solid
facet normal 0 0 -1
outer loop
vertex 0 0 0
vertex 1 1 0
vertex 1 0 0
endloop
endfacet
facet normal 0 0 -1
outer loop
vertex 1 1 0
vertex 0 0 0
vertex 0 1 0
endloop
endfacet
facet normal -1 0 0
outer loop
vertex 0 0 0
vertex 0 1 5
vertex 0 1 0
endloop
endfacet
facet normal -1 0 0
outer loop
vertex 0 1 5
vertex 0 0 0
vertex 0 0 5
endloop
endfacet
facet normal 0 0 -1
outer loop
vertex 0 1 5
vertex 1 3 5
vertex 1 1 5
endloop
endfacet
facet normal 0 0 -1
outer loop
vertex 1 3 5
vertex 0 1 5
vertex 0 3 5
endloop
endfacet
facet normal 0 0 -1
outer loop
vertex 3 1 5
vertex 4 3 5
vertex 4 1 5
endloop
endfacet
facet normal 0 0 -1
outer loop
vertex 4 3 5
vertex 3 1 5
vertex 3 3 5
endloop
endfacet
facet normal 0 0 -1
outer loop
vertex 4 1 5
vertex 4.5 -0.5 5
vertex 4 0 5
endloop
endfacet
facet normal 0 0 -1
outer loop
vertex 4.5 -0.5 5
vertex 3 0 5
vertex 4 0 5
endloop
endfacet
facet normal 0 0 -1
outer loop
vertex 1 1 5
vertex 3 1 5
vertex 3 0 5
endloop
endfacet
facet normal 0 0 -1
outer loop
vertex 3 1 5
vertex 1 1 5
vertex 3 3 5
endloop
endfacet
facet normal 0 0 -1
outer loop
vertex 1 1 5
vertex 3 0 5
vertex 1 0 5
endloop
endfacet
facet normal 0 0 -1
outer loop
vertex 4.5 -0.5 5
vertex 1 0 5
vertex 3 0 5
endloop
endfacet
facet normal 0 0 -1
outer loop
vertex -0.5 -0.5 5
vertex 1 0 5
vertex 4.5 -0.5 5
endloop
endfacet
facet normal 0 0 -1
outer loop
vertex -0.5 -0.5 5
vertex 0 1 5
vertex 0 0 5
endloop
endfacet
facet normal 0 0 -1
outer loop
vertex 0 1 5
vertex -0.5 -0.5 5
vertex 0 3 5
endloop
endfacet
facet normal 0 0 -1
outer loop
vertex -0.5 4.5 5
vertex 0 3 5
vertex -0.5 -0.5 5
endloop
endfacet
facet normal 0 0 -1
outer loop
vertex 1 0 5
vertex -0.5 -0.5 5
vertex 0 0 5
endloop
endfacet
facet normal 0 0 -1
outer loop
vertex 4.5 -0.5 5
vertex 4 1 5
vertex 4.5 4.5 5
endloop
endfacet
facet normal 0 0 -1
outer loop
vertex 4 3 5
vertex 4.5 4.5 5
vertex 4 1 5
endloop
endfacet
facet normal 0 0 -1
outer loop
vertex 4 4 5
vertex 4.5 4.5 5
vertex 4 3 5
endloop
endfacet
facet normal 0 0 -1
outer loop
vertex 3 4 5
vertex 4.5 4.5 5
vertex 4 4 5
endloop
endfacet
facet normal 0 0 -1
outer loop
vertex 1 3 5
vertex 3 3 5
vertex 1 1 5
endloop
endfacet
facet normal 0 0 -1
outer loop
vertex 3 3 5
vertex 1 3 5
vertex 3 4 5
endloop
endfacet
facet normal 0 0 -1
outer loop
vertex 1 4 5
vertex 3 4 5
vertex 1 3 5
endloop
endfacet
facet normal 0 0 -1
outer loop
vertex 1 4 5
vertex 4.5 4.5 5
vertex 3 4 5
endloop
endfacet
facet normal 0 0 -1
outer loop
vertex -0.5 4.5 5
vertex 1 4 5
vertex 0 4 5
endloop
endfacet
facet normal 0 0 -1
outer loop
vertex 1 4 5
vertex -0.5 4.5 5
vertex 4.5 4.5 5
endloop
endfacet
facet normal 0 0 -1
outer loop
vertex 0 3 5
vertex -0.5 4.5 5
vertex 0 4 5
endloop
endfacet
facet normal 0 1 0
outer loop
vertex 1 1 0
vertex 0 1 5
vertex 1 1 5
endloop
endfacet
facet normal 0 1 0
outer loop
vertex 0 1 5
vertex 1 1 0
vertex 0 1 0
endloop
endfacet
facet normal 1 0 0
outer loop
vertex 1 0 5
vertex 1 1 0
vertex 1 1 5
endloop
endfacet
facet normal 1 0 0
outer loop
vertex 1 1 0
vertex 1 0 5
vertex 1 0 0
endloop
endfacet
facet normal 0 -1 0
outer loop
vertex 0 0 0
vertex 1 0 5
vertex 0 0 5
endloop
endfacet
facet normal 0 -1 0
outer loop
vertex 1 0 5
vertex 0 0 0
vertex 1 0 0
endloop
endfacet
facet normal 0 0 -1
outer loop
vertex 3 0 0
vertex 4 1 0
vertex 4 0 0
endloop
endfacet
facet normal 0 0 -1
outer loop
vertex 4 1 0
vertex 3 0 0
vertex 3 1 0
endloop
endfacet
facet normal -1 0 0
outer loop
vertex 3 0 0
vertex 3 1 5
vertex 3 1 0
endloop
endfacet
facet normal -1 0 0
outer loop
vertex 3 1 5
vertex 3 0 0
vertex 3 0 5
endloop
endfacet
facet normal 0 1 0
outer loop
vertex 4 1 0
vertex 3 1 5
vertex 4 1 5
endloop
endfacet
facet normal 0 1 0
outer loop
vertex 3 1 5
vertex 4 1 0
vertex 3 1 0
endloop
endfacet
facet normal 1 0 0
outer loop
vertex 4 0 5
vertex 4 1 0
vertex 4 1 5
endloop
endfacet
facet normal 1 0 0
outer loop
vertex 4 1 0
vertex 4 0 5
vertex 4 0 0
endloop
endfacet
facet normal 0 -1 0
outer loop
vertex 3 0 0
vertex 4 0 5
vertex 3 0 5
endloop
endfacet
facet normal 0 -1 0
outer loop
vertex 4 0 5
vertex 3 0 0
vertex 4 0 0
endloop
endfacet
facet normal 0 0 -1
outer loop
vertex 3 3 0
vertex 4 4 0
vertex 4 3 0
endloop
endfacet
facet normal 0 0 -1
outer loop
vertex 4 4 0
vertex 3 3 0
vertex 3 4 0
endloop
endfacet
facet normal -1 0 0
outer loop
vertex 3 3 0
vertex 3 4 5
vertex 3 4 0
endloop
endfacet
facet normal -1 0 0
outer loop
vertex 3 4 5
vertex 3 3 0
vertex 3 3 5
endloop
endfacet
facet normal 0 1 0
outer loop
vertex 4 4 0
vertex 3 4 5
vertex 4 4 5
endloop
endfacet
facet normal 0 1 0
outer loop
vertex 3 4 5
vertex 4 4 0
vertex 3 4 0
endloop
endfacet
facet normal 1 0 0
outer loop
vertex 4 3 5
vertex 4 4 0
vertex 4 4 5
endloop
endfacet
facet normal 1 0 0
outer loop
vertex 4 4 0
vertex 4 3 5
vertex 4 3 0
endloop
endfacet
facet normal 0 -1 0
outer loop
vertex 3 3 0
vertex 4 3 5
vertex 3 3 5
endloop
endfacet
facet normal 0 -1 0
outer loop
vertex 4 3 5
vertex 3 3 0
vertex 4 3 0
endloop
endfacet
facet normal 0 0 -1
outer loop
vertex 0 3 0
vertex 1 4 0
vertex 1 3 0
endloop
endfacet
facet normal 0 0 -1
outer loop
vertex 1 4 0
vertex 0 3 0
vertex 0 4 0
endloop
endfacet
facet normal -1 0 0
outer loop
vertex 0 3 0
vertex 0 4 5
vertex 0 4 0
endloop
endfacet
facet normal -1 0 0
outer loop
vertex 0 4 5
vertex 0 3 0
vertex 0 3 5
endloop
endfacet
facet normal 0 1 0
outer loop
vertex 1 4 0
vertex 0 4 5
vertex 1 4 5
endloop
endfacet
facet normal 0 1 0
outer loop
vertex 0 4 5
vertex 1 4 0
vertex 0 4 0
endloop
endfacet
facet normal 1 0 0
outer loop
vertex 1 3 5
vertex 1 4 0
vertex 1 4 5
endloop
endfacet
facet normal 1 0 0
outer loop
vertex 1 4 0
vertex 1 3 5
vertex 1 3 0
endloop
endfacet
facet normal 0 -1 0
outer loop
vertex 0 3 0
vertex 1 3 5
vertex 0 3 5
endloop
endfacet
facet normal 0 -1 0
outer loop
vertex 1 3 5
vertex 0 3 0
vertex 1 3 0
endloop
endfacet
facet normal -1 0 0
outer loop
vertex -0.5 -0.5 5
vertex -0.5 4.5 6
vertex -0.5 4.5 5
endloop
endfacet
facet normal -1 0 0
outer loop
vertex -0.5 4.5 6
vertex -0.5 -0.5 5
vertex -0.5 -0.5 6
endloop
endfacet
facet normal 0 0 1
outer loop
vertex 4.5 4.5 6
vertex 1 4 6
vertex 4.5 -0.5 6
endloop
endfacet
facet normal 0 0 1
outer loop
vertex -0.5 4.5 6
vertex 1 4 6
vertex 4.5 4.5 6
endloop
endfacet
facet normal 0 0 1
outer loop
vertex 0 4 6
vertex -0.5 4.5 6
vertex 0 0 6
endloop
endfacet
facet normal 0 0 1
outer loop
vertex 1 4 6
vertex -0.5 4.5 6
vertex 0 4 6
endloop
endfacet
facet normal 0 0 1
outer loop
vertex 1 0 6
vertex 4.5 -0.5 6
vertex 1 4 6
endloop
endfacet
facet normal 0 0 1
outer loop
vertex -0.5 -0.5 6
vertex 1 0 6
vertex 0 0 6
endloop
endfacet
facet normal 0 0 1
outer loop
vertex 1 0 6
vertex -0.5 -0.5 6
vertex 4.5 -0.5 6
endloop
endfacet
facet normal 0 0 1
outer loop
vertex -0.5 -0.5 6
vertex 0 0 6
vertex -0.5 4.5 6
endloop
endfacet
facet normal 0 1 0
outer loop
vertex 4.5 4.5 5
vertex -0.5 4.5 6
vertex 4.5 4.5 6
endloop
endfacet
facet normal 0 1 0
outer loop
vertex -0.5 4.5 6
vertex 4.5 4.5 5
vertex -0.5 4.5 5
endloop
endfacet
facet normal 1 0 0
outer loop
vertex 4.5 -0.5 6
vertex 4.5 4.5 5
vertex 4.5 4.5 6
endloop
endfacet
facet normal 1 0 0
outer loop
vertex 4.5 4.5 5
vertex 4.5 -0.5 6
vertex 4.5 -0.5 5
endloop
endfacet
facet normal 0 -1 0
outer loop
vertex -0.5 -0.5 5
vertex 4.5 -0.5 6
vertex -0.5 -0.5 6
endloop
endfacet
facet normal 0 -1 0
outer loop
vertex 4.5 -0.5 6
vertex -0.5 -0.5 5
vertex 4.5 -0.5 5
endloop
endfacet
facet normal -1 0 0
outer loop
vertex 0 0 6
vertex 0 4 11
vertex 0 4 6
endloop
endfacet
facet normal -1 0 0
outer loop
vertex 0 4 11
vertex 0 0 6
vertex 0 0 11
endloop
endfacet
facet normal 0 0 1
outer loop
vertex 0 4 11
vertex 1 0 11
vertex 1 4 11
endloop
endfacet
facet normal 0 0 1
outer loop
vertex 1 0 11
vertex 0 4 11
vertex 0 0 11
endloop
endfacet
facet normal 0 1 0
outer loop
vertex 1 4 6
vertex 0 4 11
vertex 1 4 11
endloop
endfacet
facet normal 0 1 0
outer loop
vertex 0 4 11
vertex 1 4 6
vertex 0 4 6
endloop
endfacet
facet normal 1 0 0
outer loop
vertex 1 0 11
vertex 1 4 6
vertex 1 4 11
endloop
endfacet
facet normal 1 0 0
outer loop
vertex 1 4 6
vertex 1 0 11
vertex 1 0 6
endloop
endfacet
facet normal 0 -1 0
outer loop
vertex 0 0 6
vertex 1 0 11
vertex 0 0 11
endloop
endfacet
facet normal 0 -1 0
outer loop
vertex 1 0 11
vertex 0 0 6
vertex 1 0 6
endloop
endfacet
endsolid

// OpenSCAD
linear_extrude(height = 5) square([2]);
translate([3,0,0]) linear_extrude(height = 5) square([2]);
translate([3,3,0]) linear_extrude(height = 5) square([2]);
translate([0,3,0]) linear_extrude(height = 5) square([2]);

translate([-.5,-.5,5]) linear_extrude(height = 1) square(5);

translate([0,0,6]) linear_extrude(height = 5) square([1,4]);
